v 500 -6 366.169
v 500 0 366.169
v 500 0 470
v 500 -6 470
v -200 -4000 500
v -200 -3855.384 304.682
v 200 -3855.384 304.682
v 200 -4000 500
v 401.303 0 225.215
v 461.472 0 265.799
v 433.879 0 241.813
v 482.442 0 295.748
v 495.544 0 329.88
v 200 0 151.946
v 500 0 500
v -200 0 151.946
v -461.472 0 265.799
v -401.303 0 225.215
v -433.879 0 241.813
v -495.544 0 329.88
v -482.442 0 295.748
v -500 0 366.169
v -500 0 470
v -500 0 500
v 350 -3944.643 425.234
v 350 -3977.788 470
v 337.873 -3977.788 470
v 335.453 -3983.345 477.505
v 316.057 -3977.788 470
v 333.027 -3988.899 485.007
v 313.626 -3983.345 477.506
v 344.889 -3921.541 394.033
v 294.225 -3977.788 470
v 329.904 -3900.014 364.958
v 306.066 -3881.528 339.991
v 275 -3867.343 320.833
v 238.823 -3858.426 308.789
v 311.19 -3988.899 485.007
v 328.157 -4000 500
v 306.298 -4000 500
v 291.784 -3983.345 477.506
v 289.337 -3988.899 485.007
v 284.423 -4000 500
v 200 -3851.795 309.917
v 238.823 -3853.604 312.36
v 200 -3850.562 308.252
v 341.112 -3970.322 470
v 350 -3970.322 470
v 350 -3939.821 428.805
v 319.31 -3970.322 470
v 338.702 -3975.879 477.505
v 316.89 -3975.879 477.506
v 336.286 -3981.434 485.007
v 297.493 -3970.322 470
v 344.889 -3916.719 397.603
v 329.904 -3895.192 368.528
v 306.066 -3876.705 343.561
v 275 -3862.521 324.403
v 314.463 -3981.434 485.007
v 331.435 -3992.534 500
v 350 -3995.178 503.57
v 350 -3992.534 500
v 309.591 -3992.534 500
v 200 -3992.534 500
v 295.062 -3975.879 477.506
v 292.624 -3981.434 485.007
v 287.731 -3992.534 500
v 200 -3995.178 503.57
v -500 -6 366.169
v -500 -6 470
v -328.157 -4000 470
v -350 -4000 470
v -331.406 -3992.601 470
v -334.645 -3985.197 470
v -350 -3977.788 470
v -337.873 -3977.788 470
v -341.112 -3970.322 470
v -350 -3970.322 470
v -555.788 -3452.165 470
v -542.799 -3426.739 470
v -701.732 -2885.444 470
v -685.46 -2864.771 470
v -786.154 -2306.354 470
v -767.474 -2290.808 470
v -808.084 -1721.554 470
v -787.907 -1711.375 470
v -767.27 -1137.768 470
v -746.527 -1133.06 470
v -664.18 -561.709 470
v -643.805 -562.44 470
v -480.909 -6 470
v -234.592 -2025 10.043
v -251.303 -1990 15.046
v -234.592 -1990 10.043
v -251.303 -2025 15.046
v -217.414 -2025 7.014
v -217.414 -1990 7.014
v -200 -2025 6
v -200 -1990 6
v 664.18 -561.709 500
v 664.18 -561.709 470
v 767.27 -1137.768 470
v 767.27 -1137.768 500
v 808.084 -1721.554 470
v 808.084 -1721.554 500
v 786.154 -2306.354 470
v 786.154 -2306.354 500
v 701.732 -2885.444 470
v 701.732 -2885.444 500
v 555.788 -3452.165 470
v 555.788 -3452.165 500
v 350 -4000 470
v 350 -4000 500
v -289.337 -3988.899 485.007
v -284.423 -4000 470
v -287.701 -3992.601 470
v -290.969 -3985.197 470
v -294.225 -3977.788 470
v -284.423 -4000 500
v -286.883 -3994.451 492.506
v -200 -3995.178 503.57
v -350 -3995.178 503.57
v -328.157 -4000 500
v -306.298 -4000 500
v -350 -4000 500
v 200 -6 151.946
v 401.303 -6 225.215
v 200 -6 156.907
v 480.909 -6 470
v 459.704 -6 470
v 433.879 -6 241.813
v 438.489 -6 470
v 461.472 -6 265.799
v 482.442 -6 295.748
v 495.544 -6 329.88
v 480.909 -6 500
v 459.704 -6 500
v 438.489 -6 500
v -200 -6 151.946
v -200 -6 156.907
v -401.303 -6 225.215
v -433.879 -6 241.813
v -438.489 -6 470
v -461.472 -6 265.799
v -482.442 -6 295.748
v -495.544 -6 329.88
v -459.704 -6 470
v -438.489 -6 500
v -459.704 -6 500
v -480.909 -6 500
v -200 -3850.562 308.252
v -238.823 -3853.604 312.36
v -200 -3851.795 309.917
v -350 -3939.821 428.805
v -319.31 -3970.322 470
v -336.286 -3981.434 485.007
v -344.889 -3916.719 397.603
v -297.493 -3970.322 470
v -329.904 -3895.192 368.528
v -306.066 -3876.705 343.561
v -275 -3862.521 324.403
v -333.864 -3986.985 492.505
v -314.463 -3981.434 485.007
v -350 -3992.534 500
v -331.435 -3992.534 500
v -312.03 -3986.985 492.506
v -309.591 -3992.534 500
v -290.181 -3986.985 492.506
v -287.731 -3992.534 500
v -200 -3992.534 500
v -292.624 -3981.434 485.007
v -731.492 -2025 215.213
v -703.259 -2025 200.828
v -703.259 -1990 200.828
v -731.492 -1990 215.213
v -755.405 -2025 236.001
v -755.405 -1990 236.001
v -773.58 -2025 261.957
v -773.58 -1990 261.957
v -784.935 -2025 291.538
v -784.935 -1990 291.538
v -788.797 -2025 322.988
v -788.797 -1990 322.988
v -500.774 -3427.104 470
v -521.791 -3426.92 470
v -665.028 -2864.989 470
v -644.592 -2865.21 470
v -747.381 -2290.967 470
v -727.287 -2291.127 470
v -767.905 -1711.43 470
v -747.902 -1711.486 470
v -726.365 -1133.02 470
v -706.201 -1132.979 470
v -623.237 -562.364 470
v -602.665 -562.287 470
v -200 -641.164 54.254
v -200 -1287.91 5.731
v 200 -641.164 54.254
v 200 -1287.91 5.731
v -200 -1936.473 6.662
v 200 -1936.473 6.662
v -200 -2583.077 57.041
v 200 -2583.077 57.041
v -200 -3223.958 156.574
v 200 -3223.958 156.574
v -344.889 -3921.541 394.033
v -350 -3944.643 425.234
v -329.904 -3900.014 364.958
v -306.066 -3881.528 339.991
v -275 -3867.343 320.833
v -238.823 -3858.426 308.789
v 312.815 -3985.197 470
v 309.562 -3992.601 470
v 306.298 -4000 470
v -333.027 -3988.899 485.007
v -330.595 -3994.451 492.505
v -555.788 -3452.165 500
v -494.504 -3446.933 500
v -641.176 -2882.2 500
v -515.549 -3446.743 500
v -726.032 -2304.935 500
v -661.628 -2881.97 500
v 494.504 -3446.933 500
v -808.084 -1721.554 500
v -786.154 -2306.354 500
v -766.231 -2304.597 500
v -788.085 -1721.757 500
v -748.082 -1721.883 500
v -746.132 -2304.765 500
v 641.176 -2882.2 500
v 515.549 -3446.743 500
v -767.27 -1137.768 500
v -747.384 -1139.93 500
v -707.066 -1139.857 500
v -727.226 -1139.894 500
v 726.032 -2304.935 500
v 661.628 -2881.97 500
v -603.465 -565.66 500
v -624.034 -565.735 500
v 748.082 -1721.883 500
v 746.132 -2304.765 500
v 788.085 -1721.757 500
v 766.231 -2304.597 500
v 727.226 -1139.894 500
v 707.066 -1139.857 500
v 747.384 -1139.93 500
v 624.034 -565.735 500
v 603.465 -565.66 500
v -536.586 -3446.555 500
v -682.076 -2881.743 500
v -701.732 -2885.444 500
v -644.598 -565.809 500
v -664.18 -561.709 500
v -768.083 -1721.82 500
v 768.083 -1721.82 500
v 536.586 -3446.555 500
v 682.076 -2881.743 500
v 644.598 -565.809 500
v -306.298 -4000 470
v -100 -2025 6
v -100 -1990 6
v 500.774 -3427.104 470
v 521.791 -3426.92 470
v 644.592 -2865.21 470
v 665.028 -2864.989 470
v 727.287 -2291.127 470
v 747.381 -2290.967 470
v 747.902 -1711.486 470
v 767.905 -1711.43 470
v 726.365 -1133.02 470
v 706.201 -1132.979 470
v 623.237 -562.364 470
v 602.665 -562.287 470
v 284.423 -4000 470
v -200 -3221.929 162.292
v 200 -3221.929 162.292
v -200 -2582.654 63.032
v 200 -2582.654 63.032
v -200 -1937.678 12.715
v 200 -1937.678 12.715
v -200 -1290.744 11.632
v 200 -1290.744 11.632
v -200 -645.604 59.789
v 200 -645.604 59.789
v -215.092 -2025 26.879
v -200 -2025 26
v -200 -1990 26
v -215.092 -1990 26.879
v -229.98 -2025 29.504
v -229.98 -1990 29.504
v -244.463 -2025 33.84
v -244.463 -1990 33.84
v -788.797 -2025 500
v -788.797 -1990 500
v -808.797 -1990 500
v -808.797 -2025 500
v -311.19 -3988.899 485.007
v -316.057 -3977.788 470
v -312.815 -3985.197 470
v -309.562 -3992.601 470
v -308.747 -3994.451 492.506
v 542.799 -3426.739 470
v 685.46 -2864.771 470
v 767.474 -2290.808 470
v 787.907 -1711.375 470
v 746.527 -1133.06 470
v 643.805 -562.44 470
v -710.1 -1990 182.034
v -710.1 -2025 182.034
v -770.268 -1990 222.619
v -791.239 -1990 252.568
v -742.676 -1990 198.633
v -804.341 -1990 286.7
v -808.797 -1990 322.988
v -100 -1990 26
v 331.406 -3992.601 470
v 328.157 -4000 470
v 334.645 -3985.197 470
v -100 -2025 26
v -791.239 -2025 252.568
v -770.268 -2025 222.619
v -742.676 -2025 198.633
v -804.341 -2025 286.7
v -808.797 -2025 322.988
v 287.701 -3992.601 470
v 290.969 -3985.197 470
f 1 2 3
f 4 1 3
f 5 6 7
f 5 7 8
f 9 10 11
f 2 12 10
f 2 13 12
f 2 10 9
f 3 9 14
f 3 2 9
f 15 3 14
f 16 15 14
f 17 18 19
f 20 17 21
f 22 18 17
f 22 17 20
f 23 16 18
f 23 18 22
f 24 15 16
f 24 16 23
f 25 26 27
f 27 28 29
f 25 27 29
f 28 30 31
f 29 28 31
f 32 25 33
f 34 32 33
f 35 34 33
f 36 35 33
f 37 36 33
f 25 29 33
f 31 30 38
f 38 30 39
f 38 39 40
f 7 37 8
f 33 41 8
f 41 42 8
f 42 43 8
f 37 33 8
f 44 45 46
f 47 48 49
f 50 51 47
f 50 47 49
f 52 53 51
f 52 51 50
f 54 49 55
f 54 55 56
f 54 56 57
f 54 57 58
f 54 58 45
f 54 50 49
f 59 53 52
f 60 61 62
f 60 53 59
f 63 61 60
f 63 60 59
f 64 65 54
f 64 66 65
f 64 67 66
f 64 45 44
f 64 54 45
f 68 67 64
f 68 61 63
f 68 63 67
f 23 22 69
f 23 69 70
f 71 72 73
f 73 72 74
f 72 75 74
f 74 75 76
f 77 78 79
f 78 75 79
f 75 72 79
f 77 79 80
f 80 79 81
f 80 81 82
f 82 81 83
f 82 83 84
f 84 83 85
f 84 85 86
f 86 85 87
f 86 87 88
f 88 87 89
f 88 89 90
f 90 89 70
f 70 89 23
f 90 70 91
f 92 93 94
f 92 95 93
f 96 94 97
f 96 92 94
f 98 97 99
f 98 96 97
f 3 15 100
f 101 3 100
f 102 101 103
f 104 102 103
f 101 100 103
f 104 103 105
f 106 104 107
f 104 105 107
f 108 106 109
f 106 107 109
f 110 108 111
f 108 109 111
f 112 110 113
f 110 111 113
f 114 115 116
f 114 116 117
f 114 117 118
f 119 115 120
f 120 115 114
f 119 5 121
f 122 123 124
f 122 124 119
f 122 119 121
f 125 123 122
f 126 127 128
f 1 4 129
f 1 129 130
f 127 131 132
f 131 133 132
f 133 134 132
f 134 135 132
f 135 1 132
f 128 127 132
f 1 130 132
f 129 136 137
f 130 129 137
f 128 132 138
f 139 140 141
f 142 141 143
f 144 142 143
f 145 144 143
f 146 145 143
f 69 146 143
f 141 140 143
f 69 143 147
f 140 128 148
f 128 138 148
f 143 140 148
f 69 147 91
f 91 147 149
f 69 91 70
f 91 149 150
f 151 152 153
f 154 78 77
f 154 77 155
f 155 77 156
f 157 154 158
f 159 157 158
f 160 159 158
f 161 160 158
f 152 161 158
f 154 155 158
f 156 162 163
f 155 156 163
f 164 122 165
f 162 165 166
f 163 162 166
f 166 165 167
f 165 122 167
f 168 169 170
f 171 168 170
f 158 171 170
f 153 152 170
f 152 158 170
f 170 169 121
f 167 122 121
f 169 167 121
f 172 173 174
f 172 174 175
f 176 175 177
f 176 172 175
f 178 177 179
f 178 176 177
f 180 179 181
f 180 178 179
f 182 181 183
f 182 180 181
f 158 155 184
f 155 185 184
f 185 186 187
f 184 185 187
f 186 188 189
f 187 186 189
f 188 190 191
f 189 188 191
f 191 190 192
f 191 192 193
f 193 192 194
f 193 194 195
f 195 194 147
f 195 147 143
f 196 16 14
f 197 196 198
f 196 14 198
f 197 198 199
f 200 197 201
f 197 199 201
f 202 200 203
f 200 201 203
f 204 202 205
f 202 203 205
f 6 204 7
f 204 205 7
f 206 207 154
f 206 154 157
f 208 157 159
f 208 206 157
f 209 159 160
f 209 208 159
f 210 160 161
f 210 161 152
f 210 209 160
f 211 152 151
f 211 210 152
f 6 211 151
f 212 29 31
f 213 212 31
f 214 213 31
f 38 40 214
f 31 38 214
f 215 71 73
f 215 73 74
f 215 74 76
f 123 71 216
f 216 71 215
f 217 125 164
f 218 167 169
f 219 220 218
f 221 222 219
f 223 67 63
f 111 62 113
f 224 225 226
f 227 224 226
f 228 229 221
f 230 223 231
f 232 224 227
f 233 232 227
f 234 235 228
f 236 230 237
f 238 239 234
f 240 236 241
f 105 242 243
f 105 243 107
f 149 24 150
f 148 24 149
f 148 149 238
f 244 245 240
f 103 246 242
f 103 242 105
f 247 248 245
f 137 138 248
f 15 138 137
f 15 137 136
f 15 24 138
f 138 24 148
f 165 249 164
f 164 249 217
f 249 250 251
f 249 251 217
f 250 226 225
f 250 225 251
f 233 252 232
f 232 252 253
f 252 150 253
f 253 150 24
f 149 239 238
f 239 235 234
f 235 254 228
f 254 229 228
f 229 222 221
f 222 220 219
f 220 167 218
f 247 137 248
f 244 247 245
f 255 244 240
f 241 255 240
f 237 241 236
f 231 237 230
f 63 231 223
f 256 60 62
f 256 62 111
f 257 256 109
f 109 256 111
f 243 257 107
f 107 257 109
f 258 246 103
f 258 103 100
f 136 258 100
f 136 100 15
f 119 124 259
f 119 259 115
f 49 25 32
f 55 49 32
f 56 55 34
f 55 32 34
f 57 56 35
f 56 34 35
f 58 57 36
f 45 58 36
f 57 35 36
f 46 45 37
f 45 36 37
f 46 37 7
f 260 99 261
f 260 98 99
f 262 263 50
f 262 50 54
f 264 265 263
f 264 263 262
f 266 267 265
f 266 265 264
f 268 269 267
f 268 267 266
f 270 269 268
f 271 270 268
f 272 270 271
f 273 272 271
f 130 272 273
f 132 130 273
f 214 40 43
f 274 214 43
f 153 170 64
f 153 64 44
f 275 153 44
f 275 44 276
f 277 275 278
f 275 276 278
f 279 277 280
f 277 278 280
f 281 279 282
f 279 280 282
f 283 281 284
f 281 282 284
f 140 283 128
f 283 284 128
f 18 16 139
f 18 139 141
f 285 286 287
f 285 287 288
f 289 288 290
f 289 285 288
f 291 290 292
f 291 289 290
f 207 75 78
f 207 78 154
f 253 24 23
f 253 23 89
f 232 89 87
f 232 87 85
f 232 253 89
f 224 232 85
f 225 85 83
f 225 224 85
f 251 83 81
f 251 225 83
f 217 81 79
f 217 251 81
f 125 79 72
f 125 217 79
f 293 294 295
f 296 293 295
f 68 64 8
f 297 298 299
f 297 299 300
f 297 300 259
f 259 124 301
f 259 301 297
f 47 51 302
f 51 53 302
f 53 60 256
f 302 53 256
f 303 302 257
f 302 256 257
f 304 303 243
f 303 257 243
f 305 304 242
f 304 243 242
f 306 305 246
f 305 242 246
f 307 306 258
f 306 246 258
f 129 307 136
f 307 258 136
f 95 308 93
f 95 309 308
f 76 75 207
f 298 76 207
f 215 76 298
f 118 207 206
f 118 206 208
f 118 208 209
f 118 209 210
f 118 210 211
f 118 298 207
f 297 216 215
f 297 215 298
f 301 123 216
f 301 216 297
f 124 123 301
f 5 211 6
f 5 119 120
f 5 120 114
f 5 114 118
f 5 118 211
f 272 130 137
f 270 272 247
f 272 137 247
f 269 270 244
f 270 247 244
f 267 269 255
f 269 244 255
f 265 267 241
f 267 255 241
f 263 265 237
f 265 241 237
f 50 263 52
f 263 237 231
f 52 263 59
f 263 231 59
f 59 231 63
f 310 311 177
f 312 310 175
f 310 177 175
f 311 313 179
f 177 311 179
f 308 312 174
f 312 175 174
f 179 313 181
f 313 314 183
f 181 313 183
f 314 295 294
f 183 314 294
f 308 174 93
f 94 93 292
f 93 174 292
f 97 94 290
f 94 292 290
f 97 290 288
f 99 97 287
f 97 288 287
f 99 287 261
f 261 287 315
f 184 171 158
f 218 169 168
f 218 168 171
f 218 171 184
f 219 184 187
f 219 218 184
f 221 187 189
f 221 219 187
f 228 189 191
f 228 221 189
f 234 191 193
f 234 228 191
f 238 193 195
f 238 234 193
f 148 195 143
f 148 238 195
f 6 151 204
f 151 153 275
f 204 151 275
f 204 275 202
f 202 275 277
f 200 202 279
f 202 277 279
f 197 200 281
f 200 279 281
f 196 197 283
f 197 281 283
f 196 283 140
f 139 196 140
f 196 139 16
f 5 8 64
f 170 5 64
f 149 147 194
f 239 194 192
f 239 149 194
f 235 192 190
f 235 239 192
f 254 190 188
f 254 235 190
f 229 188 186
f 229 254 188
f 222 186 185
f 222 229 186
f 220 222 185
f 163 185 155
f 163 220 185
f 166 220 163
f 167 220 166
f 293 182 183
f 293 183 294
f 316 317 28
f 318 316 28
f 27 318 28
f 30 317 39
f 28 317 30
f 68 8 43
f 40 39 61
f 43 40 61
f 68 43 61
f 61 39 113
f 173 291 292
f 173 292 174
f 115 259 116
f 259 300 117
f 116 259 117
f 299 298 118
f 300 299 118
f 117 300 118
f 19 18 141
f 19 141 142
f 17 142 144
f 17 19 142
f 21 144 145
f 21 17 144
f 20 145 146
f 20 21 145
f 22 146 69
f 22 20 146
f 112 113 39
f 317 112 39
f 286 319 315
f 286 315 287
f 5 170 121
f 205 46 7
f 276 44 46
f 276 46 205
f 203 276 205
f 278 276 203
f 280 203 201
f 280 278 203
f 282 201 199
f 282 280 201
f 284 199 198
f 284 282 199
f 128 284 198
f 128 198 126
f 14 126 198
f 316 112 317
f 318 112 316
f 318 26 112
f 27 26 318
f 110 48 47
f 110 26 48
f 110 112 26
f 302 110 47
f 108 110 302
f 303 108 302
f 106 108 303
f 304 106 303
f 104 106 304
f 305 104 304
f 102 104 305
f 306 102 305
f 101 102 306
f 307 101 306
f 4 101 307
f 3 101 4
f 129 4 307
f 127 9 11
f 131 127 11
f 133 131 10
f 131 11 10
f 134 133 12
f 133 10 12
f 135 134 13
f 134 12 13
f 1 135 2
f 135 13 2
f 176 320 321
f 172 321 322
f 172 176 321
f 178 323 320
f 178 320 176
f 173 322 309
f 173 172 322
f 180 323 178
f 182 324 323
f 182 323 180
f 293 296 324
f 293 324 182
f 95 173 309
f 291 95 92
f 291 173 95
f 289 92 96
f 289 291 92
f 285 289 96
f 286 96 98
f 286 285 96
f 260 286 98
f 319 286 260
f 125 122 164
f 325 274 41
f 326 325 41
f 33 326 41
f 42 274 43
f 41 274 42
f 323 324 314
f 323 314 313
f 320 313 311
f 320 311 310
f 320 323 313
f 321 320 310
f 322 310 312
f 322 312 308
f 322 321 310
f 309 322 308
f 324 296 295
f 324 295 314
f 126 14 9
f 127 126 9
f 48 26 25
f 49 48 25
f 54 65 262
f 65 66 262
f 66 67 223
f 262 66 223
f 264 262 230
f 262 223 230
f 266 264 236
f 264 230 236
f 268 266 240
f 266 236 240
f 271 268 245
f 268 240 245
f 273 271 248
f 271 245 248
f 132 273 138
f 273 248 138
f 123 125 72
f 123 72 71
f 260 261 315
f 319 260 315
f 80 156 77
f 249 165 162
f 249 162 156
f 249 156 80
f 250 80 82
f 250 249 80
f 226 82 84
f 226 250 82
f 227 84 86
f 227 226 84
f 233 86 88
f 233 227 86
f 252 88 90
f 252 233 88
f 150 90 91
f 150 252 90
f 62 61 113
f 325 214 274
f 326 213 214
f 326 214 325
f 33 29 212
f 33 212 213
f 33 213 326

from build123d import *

# Parameters (mm, degrees)
F0_W           = 4000
F0_H           = 500
F1_DEPTH       = 200
F1_DEPTH_BACK  = 200
F3_DEPTH       = 400.001
F5_DEPTH       = 400.001
F26_DEPTH      = 6
F29_DEPTH      = 30
F32_DEPTH      = 6
F35_DEPTH      = 25
F35_DEPTH_BACK = 10


with BuildPart() as f1:
    # F0 (on Right) → F1 (new body, two sides)
    with BuildSketch(Plane.YZ) as f1_sk:
        with Locations((-2000, 250)):
            Rectangle(F0_W, F0_H)
    extrude(amount=F1_DEPTH)
    extrude(f1_sk.sketch, amount=-F1_DEPTH_BACK)

    # F2 (on face) → F3 (cut, through all)
    with BuildSketch(Plane.YZ.offset(200)):
        with BuildLine():
            Line((-4000, 0), (-1600.0000000026, 0))
            ThreePointArc((-1600.0000000026, 0), (-2737.9356206878, 76.5148232356), (-3855.3844312859, 304.6817592535))
            Line((-3855.3844312859, 304.6817592535), (-4000, 500))
            Line((-4000, 500), (-4000, 0))
        make_face()
        with BuildLine():
            Line((-1600.0000000026, 0), (0, 0))
            Line((0, 0), (0, 151.9463346239))
            ThreePointArc((0, 151.9463346239), (-796.400645751, 38.0718463313), (-1600.0000000026, 0))
        make_face()
    extrude(amount=-F3_DEPTH, mode=Mode.SUBTRACT)

    # F4 (on face) → F5 (cut, through all)
    with BuildSketch(Plane.YZ.offset(200)):
        with BuildLine():
            Line((-3992.5343822664, 500), (-3851.7952898551, 309.9173403081))
            ThreePointArc((-3851.7952898551, 309.9173403081), (-1937.6783946313, 12.7148450285), (-6, 156.9070483423))
            Line((-6, 156.9070483423), (-6, 500))
            Line((-6, 500), (-3992.5343822664, 500))
        make_face()
    extrude(amount=-F5_DEPTH, mode=Mode.SUBTRACT)

    # F27: F26 across plane


with BuildPart() as f26:
    # F25 (on face) → F26 (new body)
    with BuildSketch(Plane(origin=(0, -2344.5154791668, -1735.9025868895), x_dir=(1, 0, 0), z_dir=(0, -0.8036843318, -0.5950558753))):
        with BuildLine():
            ThreePointArc((-350, 2689.0371135927), (-306.066017178, 2582.9710964148), (-200, 2539.0371135927))
            Line((-200, 2539.0371135927), (-200, 2782.0656672296))
            Line((-200, 2782.0656672296), (-350, 2782.0656672296))
            Line((-350, 2782.0656672296), (-350, 2689.0371135927))
        make_face()
    extrude(amount=-F26_DEPTH)


with BuildPart() as f1_1:
    add(f1.part)
    add(f26.part.mirror(Plane.YZ))

    # F30: F29b, F29 across plane


with BuildPart() as f29:
    # F28 (on offset) → F29 (new body)
    with BuildSketch(Plane.XY.offset(500)):
        with BuildLine():
            ThreePointArc((-284.4229383362, -4000), (-744.9071467691, -2014.6053694553), (-436.3577170606, 0))
            Line((-436.3577170606, 0), (-457.5816106766, 0))
            ThreePointArc((-457.5816106766, 0), (-764.926072552, -2014.4849248984), (-306.2976636714, -4000))
            Line((-306.2976636714, -4000), (-284.4229383362, -4000))
        make_face()
    extrude(amount=-F29_DEPTH)


with BuildPart() as f29b:
    # F28 (on offset) → F29, piece 2 (new body)
    with BuildSketch(Plane.XY.offset(500)):
        with BuildLine():
            Line((-478.7956644468, 0), (-500, 0))
            ThreePointArc((-500, 0), (-804.9633274196, -2014.2486247782), (-350, -4000))
            Line((-350, -4000), (-328.1566152482, -4000))
            ThreePointArc((-328.1566152482, -4000), (-702.1165903, -2776.7570568907), (-779.967592138, -1500))
            ThreePointArc((-779.967592138, -1500), (-682.4018888445, -739.3545239486), (-478.7956644468, 0))
        make_face()
    extrude(amount=-F29_DEPTH)


with BuildPart() as f1_2:
    add(f1_1.part)
    add(f29b.part.mirror(Plane.YZ))
    add(f29.part.mirror(Plane.YZ))



with BuildPart() as f32:
    # F31 (on Front) → F32 (new body)
    with BuildSketch(Plane.XZ):
        with BuildLine():
            Line((200, 500), (200, 151.9463346239))
            Line((200, 151.9463346239), (401.3030214989, 225.2146425173))
            ThreePointArc((401.3030214989, 225.2146425173), (472.8728066433, 280.1320701825), (500, 366.1685356352))
            Line((500, 366.1685356352), (500, 470))
            Line((500, 470), (500, 500))
            Line((500, 500), (200, 500))
        make_face()
    extrude(amount=F32_DEPTH)


with BuildPart() as f1_3:
    add(f1_2.part)

    add(f26.part)  # F33 merges F26

    add(f29.part)  # F33 merges F29

    add(f29b.part)  # F33 merges F29b

    add(f32.part)  # F33 merges F32
    # F33: F32 across plane
    add(f32.part.mirror(Plane.YZ))


with BuildPart() as f35:
    # F34 (on offset) → F35 (new body, two sides)
    with BuildSketch(Plane.XZ.offset(2000)) as f35_sk:
        with BuildLine():
            Line((-200, 6), (-100, 6))
            Line((-100, 6), (-100, 26))
            Line((-100, 26), (-200, 26))
            ThreePointArc((-200, 26), (-222.5742630967, 27.9749921084), (-244.4626186323, 33.8399592978))
            Line((-244.4626186323, 33.8399592978), (-703.259194824, 200.8282566149))
            ThreePointArc((-703.259194824, 200.8282566149), (-765.2863419493, 248.4233605914), (-788.7965761917, 322.988297317))
            Line((-788.7965761917, 322.988297317), (-788.7965761917, 500))
            Line((-788.7965761917, 500), (-808.7965761917, 500))
            Line((-808.7965761917, 500), (-808.7965761917, 470))
            Line((-808.7965761917, 470), (-808.7965761917, 322.988297317))
            ThreePointArc((-808.7965761917, 322.988297317), (-781.669382835, 236.9518318644), (-710.0995976905, 182.0344041991))
            Line((-710.0995976905, 182.0344041991), (-251.3030214989, 15.0461068821))
            ThreePointArc((-251.3030214989, 15.0461068821), (-226.04722665, 8.2788370482), (-200, 6))
        make_face()
    extrude(amount=F35_DEPTH)
    extrude(f35_sk.sketch, amount=-F35_DEPTH_BACK)


solid = Compound([f1_3.part, f35.part])
